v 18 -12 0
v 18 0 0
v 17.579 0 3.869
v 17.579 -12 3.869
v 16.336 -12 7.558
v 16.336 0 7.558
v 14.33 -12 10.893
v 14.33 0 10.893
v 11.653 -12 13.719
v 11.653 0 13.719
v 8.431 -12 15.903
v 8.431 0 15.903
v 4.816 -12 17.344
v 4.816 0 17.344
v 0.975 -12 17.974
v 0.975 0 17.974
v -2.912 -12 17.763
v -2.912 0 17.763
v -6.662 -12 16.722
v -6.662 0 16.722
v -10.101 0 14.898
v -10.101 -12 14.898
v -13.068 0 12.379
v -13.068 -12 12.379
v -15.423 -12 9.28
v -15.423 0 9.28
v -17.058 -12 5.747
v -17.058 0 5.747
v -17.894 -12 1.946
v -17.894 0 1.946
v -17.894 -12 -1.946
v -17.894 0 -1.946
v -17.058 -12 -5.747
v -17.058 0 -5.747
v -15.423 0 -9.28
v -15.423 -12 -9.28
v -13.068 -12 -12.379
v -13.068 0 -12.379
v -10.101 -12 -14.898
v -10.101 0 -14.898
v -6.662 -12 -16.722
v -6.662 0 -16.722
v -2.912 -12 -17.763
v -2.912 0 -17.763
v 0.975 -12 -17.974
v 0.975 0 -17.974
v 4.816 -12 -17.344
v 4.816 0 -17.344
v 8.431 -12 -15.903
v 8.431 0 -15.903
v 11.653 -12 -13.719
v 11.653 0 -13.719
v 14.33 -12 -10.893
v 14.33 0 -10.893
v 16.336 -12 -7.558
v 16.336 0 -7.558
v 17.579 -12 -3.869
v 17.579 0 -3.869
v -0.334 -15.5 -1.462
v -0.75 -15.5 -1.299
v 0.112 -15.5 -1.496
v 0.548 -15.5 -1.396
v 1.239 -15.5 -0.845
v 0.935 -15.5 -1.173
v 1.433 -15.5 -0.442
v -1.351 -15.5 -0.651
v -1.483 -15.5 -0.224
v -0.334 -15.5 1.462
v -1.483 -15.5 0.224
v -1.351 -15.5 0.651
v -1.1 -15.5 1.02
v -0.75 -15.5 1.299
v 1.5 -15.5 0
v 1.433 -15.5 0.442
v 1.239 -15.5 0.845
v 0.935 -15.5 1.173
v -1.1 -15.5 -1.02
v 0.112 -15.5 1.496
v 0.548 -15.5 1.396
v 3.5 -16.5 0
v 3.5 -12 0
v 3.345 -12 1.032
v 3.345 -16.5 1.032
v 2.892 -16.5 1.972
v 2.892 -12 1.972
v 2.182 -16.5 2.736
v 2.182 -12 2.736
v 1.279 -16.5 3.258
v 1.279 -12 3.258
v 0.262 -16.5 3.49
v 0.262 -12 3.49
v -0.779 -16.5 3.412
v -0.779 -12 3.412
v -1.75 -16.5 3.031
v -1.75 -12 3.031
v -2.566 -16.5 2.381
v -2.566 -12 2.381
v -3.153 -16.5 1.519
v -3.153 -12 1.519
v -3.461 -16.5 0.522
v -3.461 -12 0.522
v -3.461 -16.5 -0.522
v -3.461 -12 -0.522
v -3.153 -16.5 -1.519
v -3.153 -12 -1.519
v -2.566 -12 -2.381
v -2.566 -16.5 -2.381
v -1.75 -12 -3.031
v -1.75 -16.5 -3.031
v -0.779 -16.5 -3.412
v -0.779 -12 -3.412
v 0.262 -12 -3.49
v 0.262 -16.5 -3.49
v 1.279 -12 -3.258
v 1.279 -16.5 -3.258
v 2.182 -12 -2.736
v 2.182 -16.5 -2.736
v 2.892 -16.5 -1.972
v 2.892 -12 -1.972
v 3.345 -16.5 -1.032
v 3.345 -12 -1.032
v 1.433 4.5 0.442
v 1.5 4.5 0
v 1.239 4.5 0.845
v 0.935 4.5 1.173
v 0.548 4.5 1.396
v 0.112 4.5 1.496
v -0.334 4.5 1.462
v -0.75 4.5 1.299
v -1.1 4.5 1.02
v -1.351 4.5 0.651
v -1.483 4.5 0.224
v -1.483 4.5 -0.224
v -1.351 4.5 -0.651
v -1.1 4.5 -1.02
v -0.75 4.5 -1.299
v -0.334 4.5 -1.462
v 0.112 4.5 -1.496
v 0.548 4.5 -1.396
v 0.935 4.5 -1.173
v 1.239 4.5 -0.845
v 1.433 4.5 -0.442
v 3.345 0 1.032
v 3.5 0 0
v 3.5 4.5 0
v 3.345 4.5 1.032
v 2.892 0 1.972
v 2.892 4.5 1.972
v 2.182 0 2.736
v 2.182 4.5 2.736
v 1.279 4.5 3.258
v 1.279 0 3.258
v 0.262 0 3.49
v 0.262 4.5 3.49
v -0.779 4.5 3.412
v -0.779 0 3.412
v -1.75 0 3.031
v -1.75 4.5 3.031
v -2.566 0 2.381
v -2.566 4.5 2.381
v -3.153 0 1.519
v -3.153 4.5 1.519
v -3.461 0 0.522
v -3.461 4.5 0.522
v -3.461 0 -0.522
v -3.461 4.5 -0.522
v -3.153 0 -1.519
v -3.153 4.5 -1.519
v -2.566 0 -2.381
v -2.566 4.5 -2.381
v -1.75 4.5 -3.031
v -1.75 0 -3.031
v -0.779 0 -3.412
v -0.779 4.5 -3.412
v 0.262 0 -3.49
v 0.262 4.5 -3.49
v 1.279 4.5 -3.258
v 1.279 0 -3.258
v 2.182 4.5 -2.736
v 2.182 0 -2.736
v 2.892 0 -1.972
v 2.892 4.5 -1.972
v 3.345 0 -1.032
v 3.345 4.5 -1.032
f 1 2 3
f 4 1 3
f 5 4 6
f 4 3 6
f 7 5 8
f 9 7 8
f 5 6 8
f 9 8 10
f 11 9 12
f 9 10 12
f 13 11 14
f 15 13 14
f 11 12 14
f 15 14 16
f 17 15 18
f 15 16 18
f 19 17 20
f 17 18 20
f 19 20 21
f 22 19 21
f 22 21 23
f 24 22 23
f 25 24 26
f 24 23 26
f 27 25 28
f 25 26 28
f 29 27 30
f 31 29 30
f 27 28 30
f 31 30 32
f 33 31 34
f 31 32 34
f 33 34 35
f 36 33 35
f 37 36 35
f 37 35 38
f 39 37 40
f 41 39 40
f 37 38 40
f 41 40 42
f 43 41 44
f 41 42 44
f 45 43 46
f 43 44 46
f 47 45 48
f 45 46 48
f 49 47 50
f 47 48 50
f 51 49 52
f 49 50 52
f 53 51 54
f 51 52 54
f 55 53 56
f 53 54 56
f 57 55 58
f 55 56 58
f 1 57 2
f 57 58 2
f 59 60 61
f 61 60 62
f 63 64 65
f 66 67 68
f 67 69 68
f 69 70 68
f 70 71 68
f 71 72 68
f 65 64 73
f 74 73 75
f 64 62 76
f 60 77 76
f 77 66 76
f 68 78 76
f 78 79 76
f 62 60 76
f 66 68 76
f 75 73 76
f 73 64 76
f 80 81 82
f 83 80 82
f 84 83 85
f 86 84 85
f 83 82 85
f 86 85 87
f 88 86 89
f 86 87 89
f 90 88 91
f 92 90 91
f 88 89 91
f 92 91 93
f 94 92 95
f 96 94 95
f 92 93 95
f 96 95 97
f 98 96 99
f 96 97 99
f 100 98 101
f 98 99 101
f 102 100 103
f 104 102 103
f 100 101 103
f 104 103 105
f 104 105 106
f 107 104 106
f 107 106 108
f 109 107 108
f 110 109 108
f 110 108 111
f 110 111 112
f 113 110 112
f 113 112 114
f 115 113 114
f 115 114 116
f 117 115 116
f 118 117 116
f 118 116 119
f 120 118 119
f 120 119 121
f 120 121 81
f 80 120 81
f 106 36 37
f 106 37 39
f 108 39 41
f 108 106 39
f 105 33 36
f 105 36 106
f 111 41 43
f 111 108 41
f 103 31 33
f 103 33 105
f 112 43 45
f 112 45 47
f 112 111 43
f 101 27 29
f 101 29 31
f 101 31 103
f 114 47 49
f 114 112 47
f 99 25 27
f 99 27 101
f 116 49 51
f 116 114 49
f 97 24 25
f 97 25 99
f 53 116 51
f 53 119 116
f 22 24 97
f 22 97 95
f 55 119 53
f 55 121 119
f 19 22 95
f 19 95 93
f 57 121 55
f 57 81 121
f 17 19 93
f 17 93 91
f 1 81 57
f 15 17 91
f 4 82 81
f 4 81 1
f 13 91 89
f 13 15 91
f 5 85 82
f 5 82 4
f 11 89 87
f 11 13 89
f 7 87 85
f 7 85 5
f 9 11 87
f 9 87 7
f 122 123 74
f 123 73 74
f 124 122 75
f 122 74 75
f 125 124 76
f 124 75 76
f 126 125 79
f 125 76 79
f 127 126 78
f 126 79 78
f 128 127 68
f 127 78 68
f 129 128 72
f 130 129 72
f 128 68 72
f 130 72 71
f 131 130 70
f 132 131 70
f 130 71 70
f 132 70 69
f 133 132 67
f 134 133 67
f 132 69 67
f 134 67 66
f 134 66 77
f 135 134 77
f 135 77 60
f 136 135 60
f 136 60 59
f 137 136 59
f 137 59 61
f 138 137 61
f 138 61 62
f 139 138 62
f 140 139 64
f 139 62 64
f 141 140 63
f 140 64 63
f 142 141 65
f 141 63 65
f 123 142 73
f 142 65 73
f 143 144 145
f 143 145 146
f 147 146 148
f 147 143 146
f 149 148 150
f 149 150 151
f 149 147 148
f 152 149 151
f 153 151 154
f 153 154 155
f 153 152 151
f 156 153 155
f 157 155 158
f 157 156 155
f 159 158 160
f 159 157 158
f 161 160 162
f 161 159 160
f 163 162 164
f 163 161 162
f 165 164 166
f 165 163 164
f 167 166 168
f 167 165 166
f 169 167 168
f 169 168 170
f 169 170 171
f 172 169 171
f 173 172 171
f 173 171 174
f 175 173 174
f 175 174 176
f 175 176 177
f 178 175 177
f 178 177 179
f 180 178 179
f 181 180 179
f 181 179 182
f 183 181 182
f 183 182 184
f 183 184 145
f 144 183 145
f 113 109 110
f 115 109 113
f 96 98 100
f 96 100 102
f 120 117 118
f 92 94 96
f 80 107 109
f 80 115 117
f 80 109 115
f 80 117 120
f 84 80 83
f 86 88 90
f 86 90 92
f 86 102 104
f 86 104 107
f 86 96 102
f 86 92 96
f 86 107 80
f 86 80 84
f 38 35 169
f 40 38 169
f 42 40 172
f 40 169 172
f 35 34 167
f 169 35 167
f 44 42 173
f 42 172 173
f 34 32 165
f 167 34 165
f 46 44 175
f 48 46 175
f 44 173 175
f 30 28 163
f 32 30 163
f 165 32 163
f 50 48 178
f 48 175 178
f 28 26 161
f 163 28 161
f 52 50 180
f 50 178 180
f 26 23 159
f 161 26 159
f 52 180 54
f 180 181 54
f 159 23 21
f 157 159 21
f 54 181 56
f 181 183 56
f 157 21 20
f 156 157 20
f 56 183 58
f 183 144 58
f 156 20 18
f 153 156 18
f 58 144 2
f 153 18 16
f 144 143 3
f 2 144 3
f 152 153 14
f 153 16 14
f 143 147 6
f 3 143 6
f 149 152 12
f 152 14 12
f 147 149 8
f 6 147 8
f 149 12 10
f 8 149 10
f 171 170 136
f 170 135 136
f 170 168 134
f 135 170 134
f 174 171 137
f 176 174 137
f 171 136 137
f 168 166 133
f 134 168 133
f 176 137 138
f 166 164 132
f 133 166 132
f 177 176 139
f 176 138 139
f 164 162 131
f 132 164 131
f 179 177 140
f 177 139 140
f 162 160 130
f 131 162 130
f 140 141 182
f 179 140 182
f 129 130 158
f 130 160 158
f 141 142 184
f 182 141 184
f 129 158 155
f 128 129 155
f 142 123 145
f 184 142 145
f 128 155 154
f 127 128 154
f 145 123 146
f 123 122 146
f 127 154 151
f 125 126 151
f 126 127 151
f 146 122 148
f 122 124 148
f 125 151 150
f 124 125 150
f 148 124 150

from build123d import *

# Parameters (mm, degrees)
F0_R        = 18
F0_R_2      = 3.5
F1_DEPTH    = 12
F0_R_3      = 1.5
F2_DEPTH    = 16.5
F2_FACE_R   = 3.5
F2_FACE_R_2 = 1.5
F3_DEPTH    = 21
F4_R        = 2.51997
F5_DEPTH    = 1


with BuildPart() as f1:
    # F0 (on Front) → F1 (new body)
    with BuildSketch(Plane.XZ):
        Circle(F0_R)
        Circle(F0_R_2, mode=Mode.SUBTRACT)
    extrude(amount=F1_DEPTH)

    # F0 (on Front) → F2 (join)
    with BuildSketch(Plane.XZ):
        Circle(F0_R_2)
        Circle(F0_R_3, mode=Mode.SUBTRACT)
    extrude(amount=F2_DEPTH)

    # F2_face (on face) → F3 (join)
    with BuildSketch(Plane.XZ.offset(16.5)):
        Circle(F2_FACE_R)
        Circle(F2_FACE_R_2, mode=Mode.SUBTRACT)
    extrude(amount=-F3_DEPTH)

    # F4 (on face) → F5 (join)
    with BuildSketch(Plane.XZ.offset(16.5)):
        Circle(F4_R)
    extrude(amount=-F5_DEPTH)


solid = f1.part
